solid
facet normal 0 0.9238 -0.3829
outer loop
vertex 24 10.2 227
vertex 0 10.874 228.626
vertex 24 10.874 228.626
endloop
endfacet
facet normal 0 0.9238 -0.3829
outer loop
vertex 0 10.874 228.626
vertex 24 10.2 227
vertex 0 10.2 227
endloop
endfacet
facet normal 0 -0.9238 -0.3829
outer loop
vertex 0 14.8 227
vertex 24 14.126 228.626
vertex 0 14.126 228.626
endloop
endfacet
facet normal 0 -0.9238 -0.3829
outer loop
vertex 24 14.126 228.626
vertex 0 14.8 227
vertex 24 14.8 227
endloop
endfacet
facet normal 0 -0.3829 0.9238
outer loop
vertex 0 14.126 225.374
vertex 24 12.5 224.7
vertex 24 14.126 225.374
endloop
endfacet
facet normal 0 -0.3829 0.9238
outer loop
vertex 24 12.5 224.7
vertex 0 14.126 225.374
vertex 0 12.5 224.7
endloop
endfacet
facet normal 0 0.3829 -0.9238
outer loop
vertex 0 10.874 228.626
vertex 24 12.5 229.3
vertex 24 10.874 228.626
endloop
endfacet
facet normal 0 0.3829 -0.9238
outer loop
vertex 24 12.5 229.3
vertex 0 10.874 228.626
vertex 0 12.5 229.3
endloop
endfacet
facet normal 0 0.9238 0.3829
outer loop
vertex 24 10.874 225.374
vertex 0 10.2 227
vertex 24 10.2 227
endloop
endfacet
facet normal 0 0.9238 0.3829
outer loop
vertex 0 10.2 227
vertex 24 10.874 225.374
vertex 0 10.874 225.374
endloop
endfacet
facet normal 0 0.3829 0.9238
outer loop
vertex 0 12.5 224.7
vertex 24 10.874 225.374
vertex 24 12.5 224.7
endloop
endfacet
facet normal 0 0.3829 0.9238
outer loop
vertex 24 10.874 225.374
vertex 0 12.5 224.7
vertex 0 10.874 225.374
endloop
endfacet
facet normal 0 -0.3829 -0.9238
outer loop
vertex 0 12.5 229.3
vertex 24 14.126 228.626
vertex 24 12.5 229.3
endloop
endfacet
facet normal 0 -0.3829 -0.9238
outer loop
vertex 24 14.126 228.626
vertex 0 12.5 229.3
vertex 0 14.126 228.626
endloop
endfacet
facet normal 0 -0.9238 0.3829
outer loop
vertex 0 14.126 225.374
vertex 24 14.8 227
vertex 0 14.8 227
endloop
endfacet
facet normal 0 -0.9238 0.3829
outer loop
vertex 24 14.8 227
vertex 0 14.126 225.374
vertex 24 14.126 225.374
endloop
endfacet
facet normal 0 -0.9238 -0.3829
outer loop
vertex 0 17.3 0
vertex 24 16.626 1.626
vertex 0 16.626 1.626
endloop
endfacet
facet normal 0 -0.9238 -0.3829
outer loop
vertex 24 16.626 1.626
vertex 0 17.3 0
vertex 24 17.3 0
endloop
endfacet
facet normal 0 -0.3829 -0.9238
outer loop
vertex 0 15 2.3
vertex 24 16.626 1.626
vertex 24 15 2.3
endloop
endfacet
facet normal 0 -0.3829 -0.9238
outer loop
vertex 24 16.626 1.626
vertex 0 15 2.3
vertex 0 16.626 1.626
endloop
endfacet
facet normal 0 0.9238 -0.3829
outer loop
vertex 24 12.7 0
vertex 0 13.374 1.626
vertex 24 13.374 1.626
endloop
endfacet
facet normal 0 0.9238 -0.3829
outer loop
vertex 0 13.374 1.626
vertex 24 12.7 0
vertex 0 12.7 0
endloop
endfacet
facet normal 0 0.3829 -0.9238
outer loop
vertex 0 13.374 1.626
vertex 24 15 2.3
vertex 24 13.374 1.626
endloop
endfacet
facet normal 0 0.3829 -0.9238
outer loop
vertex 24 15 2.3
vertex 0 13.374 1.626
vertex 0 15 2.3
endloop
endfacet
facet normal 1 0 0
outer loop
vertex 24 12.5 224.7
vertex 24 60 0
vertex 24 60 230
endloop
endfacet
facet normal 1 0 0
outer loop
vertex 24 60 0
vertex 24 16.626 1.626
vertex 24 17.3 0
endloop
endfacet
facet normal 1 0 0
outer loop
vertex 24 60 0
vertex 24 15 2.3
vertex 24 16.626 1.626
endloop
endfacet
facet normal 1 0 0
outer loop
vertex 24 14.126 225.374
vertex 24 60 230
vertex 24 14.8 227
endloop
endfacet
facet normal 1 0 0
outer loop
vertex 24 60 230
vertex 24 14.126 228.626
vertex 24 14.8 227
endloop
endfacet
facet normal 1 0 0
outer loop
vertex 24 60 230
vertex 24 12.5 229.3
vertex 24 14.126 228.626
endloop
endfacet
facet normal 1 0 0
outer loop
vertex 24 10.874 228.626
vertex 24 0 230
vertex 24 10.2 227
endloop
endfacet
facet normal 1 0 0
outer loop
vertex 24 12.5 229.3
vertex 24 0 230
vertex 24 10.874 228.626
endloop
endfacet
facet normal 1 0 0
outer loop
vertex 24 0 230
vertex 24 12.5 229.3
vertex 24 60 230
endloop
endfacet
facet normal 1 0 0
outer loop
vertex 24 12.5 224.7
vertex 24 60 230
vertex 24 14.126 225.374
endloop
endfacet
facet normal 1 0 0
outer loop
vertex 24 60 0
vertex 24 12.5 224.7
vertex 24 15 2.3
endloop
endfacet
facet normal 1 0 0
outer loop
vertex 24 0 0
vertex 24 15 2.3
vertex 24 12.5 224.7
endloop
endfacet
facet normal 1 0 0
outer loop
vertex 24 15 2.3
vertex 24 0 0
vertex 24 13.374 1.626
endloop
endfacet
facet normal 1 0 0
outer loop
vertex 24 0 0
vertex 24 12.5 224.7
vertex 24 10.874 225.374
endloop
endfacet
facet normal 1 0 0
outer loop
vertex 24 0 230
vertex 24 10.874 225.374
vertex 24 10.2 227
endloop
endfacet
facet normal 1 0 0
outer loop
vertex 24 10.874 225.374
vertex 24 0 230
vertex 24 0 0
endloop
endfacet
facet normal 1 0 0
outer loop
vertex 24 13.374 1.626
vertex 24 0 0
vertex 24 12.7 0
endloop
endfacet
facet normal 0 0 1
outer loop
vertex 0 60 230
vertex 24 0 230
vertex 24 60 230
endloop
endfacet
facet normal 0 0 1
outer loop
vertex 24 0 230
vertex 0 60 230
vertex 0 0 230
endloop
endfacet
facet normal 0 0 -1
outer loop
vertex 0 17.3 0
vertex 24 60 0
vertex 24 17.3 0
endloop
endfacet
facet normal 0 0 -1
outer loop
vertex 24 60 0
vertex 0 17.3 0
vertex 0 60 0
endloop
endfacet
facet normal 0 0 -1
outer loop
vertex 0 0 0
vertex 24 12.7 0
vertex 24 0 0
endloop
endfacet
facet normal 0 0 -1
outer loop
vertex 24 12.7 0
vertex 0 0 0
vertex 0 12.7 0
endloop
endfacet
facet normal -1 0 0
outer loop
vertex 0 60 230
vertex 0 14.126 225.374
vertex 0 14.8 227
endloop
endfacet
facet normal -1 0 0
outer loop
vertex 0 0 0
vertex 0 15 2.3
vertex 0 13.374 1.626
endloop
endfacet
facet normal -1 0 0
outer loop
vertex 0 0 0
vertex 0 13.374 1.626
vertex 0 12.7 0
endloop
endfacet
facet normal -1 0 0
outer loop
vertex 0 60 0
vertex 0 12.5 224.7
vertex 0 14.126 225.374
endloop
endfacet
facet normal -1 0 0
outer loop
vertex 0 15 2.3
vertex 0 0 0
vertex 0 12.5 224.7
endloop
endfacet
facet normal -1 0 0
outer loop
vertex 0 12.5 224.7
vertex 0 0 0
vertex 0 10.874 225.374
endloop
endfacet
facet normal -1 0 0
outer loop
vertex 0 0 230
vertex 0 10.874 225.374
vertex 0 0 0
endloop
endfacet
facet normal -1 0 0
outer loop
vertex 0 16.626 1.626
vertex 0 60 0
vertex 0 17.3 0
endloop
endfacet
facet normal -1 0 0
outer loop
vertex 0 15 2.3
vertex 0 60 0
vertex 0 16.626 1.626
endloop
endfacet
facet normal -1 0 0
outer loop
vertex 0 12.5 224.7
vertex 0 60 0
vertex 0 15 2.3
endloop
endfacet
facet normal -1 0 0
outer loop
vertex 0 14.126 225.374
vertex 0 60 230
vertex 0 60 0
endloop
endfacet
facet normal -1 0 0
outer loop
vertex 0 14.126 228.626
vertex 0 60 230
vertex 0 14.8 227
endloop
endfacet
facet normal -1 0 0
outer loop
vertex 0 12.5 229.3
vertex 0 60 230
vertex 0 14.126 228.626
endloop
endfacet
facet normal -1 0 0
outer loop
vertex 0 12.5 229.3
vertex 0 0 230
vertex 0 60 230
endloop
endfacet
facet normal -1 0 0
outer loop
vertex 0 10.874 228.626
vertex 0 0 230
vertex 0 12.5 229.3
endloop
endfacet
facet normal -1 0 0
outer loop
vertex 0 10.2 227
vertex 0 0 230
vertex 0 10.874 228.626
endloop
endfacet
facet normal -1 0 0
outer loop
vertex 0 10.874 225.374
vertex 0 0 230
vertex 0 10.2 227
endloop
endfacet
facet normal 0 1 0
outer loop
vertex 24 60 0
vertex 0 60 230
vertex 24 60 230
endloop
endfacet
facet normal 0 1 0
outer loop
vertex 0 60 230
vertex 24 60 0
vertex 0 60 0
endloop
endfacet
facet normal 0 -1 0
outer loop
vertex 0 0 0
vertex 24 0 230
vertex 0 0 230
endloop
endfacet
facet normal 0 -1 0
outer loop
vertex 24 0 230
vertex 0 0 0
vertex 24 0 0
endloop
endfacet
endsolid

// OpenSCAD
// 独立摆锤台架 —— Part 2b: 立柱 column.scad
// 把 U 夹抬高到桌面上方, 使摆臂(≈L=200mm)能在桌沿外自由摆动:
// 轴心高 = 底座8 + 立柱230 + U夹底部4 + 半高10 = 252mm ≥ L+50。
// 顶部 4×M4 沉头(与 servo_clamp 底部孔距一致), 底部 2×M4 与底座相连。

col_h   = 230;
col_w   = 60;   // 深(Y), 与 U 夹近宽
col_t   = 24;   // 厚(X)

m4 = 4.6;
top_hole_sp = 25;   // 顶部两孔距(U 夹底部孔距)
bot_hole_sp = 30;   // 底部两孔距(装底座)

difference() {
    cube([col_t, col_w, col_h]);
    // 顶部 2×M4 通孔(贯穿 X, 接 U 夹)
    for (sy = [-1, 1])
        translate([col_t / 2, sy * top_hole_sp / 2 + 0, col_h - 3])
            rotate([0, 90, 0]) cylinder(d = m4, h = col_t + 2, center = true);
    // 底部 2×M4 沉头
    for (sy = [-1, 1])
        translate([col_t / 2, sy * bot_hole_sp / 2, 0])
            rotate([0, 90, 0]) cylinder(d = m4, h = col_t + 2, center = true);
}
echo(str("立柱 = ", col_t, " x ", col_w, " x ", col_h, " mm (轴心高≈252)"));
